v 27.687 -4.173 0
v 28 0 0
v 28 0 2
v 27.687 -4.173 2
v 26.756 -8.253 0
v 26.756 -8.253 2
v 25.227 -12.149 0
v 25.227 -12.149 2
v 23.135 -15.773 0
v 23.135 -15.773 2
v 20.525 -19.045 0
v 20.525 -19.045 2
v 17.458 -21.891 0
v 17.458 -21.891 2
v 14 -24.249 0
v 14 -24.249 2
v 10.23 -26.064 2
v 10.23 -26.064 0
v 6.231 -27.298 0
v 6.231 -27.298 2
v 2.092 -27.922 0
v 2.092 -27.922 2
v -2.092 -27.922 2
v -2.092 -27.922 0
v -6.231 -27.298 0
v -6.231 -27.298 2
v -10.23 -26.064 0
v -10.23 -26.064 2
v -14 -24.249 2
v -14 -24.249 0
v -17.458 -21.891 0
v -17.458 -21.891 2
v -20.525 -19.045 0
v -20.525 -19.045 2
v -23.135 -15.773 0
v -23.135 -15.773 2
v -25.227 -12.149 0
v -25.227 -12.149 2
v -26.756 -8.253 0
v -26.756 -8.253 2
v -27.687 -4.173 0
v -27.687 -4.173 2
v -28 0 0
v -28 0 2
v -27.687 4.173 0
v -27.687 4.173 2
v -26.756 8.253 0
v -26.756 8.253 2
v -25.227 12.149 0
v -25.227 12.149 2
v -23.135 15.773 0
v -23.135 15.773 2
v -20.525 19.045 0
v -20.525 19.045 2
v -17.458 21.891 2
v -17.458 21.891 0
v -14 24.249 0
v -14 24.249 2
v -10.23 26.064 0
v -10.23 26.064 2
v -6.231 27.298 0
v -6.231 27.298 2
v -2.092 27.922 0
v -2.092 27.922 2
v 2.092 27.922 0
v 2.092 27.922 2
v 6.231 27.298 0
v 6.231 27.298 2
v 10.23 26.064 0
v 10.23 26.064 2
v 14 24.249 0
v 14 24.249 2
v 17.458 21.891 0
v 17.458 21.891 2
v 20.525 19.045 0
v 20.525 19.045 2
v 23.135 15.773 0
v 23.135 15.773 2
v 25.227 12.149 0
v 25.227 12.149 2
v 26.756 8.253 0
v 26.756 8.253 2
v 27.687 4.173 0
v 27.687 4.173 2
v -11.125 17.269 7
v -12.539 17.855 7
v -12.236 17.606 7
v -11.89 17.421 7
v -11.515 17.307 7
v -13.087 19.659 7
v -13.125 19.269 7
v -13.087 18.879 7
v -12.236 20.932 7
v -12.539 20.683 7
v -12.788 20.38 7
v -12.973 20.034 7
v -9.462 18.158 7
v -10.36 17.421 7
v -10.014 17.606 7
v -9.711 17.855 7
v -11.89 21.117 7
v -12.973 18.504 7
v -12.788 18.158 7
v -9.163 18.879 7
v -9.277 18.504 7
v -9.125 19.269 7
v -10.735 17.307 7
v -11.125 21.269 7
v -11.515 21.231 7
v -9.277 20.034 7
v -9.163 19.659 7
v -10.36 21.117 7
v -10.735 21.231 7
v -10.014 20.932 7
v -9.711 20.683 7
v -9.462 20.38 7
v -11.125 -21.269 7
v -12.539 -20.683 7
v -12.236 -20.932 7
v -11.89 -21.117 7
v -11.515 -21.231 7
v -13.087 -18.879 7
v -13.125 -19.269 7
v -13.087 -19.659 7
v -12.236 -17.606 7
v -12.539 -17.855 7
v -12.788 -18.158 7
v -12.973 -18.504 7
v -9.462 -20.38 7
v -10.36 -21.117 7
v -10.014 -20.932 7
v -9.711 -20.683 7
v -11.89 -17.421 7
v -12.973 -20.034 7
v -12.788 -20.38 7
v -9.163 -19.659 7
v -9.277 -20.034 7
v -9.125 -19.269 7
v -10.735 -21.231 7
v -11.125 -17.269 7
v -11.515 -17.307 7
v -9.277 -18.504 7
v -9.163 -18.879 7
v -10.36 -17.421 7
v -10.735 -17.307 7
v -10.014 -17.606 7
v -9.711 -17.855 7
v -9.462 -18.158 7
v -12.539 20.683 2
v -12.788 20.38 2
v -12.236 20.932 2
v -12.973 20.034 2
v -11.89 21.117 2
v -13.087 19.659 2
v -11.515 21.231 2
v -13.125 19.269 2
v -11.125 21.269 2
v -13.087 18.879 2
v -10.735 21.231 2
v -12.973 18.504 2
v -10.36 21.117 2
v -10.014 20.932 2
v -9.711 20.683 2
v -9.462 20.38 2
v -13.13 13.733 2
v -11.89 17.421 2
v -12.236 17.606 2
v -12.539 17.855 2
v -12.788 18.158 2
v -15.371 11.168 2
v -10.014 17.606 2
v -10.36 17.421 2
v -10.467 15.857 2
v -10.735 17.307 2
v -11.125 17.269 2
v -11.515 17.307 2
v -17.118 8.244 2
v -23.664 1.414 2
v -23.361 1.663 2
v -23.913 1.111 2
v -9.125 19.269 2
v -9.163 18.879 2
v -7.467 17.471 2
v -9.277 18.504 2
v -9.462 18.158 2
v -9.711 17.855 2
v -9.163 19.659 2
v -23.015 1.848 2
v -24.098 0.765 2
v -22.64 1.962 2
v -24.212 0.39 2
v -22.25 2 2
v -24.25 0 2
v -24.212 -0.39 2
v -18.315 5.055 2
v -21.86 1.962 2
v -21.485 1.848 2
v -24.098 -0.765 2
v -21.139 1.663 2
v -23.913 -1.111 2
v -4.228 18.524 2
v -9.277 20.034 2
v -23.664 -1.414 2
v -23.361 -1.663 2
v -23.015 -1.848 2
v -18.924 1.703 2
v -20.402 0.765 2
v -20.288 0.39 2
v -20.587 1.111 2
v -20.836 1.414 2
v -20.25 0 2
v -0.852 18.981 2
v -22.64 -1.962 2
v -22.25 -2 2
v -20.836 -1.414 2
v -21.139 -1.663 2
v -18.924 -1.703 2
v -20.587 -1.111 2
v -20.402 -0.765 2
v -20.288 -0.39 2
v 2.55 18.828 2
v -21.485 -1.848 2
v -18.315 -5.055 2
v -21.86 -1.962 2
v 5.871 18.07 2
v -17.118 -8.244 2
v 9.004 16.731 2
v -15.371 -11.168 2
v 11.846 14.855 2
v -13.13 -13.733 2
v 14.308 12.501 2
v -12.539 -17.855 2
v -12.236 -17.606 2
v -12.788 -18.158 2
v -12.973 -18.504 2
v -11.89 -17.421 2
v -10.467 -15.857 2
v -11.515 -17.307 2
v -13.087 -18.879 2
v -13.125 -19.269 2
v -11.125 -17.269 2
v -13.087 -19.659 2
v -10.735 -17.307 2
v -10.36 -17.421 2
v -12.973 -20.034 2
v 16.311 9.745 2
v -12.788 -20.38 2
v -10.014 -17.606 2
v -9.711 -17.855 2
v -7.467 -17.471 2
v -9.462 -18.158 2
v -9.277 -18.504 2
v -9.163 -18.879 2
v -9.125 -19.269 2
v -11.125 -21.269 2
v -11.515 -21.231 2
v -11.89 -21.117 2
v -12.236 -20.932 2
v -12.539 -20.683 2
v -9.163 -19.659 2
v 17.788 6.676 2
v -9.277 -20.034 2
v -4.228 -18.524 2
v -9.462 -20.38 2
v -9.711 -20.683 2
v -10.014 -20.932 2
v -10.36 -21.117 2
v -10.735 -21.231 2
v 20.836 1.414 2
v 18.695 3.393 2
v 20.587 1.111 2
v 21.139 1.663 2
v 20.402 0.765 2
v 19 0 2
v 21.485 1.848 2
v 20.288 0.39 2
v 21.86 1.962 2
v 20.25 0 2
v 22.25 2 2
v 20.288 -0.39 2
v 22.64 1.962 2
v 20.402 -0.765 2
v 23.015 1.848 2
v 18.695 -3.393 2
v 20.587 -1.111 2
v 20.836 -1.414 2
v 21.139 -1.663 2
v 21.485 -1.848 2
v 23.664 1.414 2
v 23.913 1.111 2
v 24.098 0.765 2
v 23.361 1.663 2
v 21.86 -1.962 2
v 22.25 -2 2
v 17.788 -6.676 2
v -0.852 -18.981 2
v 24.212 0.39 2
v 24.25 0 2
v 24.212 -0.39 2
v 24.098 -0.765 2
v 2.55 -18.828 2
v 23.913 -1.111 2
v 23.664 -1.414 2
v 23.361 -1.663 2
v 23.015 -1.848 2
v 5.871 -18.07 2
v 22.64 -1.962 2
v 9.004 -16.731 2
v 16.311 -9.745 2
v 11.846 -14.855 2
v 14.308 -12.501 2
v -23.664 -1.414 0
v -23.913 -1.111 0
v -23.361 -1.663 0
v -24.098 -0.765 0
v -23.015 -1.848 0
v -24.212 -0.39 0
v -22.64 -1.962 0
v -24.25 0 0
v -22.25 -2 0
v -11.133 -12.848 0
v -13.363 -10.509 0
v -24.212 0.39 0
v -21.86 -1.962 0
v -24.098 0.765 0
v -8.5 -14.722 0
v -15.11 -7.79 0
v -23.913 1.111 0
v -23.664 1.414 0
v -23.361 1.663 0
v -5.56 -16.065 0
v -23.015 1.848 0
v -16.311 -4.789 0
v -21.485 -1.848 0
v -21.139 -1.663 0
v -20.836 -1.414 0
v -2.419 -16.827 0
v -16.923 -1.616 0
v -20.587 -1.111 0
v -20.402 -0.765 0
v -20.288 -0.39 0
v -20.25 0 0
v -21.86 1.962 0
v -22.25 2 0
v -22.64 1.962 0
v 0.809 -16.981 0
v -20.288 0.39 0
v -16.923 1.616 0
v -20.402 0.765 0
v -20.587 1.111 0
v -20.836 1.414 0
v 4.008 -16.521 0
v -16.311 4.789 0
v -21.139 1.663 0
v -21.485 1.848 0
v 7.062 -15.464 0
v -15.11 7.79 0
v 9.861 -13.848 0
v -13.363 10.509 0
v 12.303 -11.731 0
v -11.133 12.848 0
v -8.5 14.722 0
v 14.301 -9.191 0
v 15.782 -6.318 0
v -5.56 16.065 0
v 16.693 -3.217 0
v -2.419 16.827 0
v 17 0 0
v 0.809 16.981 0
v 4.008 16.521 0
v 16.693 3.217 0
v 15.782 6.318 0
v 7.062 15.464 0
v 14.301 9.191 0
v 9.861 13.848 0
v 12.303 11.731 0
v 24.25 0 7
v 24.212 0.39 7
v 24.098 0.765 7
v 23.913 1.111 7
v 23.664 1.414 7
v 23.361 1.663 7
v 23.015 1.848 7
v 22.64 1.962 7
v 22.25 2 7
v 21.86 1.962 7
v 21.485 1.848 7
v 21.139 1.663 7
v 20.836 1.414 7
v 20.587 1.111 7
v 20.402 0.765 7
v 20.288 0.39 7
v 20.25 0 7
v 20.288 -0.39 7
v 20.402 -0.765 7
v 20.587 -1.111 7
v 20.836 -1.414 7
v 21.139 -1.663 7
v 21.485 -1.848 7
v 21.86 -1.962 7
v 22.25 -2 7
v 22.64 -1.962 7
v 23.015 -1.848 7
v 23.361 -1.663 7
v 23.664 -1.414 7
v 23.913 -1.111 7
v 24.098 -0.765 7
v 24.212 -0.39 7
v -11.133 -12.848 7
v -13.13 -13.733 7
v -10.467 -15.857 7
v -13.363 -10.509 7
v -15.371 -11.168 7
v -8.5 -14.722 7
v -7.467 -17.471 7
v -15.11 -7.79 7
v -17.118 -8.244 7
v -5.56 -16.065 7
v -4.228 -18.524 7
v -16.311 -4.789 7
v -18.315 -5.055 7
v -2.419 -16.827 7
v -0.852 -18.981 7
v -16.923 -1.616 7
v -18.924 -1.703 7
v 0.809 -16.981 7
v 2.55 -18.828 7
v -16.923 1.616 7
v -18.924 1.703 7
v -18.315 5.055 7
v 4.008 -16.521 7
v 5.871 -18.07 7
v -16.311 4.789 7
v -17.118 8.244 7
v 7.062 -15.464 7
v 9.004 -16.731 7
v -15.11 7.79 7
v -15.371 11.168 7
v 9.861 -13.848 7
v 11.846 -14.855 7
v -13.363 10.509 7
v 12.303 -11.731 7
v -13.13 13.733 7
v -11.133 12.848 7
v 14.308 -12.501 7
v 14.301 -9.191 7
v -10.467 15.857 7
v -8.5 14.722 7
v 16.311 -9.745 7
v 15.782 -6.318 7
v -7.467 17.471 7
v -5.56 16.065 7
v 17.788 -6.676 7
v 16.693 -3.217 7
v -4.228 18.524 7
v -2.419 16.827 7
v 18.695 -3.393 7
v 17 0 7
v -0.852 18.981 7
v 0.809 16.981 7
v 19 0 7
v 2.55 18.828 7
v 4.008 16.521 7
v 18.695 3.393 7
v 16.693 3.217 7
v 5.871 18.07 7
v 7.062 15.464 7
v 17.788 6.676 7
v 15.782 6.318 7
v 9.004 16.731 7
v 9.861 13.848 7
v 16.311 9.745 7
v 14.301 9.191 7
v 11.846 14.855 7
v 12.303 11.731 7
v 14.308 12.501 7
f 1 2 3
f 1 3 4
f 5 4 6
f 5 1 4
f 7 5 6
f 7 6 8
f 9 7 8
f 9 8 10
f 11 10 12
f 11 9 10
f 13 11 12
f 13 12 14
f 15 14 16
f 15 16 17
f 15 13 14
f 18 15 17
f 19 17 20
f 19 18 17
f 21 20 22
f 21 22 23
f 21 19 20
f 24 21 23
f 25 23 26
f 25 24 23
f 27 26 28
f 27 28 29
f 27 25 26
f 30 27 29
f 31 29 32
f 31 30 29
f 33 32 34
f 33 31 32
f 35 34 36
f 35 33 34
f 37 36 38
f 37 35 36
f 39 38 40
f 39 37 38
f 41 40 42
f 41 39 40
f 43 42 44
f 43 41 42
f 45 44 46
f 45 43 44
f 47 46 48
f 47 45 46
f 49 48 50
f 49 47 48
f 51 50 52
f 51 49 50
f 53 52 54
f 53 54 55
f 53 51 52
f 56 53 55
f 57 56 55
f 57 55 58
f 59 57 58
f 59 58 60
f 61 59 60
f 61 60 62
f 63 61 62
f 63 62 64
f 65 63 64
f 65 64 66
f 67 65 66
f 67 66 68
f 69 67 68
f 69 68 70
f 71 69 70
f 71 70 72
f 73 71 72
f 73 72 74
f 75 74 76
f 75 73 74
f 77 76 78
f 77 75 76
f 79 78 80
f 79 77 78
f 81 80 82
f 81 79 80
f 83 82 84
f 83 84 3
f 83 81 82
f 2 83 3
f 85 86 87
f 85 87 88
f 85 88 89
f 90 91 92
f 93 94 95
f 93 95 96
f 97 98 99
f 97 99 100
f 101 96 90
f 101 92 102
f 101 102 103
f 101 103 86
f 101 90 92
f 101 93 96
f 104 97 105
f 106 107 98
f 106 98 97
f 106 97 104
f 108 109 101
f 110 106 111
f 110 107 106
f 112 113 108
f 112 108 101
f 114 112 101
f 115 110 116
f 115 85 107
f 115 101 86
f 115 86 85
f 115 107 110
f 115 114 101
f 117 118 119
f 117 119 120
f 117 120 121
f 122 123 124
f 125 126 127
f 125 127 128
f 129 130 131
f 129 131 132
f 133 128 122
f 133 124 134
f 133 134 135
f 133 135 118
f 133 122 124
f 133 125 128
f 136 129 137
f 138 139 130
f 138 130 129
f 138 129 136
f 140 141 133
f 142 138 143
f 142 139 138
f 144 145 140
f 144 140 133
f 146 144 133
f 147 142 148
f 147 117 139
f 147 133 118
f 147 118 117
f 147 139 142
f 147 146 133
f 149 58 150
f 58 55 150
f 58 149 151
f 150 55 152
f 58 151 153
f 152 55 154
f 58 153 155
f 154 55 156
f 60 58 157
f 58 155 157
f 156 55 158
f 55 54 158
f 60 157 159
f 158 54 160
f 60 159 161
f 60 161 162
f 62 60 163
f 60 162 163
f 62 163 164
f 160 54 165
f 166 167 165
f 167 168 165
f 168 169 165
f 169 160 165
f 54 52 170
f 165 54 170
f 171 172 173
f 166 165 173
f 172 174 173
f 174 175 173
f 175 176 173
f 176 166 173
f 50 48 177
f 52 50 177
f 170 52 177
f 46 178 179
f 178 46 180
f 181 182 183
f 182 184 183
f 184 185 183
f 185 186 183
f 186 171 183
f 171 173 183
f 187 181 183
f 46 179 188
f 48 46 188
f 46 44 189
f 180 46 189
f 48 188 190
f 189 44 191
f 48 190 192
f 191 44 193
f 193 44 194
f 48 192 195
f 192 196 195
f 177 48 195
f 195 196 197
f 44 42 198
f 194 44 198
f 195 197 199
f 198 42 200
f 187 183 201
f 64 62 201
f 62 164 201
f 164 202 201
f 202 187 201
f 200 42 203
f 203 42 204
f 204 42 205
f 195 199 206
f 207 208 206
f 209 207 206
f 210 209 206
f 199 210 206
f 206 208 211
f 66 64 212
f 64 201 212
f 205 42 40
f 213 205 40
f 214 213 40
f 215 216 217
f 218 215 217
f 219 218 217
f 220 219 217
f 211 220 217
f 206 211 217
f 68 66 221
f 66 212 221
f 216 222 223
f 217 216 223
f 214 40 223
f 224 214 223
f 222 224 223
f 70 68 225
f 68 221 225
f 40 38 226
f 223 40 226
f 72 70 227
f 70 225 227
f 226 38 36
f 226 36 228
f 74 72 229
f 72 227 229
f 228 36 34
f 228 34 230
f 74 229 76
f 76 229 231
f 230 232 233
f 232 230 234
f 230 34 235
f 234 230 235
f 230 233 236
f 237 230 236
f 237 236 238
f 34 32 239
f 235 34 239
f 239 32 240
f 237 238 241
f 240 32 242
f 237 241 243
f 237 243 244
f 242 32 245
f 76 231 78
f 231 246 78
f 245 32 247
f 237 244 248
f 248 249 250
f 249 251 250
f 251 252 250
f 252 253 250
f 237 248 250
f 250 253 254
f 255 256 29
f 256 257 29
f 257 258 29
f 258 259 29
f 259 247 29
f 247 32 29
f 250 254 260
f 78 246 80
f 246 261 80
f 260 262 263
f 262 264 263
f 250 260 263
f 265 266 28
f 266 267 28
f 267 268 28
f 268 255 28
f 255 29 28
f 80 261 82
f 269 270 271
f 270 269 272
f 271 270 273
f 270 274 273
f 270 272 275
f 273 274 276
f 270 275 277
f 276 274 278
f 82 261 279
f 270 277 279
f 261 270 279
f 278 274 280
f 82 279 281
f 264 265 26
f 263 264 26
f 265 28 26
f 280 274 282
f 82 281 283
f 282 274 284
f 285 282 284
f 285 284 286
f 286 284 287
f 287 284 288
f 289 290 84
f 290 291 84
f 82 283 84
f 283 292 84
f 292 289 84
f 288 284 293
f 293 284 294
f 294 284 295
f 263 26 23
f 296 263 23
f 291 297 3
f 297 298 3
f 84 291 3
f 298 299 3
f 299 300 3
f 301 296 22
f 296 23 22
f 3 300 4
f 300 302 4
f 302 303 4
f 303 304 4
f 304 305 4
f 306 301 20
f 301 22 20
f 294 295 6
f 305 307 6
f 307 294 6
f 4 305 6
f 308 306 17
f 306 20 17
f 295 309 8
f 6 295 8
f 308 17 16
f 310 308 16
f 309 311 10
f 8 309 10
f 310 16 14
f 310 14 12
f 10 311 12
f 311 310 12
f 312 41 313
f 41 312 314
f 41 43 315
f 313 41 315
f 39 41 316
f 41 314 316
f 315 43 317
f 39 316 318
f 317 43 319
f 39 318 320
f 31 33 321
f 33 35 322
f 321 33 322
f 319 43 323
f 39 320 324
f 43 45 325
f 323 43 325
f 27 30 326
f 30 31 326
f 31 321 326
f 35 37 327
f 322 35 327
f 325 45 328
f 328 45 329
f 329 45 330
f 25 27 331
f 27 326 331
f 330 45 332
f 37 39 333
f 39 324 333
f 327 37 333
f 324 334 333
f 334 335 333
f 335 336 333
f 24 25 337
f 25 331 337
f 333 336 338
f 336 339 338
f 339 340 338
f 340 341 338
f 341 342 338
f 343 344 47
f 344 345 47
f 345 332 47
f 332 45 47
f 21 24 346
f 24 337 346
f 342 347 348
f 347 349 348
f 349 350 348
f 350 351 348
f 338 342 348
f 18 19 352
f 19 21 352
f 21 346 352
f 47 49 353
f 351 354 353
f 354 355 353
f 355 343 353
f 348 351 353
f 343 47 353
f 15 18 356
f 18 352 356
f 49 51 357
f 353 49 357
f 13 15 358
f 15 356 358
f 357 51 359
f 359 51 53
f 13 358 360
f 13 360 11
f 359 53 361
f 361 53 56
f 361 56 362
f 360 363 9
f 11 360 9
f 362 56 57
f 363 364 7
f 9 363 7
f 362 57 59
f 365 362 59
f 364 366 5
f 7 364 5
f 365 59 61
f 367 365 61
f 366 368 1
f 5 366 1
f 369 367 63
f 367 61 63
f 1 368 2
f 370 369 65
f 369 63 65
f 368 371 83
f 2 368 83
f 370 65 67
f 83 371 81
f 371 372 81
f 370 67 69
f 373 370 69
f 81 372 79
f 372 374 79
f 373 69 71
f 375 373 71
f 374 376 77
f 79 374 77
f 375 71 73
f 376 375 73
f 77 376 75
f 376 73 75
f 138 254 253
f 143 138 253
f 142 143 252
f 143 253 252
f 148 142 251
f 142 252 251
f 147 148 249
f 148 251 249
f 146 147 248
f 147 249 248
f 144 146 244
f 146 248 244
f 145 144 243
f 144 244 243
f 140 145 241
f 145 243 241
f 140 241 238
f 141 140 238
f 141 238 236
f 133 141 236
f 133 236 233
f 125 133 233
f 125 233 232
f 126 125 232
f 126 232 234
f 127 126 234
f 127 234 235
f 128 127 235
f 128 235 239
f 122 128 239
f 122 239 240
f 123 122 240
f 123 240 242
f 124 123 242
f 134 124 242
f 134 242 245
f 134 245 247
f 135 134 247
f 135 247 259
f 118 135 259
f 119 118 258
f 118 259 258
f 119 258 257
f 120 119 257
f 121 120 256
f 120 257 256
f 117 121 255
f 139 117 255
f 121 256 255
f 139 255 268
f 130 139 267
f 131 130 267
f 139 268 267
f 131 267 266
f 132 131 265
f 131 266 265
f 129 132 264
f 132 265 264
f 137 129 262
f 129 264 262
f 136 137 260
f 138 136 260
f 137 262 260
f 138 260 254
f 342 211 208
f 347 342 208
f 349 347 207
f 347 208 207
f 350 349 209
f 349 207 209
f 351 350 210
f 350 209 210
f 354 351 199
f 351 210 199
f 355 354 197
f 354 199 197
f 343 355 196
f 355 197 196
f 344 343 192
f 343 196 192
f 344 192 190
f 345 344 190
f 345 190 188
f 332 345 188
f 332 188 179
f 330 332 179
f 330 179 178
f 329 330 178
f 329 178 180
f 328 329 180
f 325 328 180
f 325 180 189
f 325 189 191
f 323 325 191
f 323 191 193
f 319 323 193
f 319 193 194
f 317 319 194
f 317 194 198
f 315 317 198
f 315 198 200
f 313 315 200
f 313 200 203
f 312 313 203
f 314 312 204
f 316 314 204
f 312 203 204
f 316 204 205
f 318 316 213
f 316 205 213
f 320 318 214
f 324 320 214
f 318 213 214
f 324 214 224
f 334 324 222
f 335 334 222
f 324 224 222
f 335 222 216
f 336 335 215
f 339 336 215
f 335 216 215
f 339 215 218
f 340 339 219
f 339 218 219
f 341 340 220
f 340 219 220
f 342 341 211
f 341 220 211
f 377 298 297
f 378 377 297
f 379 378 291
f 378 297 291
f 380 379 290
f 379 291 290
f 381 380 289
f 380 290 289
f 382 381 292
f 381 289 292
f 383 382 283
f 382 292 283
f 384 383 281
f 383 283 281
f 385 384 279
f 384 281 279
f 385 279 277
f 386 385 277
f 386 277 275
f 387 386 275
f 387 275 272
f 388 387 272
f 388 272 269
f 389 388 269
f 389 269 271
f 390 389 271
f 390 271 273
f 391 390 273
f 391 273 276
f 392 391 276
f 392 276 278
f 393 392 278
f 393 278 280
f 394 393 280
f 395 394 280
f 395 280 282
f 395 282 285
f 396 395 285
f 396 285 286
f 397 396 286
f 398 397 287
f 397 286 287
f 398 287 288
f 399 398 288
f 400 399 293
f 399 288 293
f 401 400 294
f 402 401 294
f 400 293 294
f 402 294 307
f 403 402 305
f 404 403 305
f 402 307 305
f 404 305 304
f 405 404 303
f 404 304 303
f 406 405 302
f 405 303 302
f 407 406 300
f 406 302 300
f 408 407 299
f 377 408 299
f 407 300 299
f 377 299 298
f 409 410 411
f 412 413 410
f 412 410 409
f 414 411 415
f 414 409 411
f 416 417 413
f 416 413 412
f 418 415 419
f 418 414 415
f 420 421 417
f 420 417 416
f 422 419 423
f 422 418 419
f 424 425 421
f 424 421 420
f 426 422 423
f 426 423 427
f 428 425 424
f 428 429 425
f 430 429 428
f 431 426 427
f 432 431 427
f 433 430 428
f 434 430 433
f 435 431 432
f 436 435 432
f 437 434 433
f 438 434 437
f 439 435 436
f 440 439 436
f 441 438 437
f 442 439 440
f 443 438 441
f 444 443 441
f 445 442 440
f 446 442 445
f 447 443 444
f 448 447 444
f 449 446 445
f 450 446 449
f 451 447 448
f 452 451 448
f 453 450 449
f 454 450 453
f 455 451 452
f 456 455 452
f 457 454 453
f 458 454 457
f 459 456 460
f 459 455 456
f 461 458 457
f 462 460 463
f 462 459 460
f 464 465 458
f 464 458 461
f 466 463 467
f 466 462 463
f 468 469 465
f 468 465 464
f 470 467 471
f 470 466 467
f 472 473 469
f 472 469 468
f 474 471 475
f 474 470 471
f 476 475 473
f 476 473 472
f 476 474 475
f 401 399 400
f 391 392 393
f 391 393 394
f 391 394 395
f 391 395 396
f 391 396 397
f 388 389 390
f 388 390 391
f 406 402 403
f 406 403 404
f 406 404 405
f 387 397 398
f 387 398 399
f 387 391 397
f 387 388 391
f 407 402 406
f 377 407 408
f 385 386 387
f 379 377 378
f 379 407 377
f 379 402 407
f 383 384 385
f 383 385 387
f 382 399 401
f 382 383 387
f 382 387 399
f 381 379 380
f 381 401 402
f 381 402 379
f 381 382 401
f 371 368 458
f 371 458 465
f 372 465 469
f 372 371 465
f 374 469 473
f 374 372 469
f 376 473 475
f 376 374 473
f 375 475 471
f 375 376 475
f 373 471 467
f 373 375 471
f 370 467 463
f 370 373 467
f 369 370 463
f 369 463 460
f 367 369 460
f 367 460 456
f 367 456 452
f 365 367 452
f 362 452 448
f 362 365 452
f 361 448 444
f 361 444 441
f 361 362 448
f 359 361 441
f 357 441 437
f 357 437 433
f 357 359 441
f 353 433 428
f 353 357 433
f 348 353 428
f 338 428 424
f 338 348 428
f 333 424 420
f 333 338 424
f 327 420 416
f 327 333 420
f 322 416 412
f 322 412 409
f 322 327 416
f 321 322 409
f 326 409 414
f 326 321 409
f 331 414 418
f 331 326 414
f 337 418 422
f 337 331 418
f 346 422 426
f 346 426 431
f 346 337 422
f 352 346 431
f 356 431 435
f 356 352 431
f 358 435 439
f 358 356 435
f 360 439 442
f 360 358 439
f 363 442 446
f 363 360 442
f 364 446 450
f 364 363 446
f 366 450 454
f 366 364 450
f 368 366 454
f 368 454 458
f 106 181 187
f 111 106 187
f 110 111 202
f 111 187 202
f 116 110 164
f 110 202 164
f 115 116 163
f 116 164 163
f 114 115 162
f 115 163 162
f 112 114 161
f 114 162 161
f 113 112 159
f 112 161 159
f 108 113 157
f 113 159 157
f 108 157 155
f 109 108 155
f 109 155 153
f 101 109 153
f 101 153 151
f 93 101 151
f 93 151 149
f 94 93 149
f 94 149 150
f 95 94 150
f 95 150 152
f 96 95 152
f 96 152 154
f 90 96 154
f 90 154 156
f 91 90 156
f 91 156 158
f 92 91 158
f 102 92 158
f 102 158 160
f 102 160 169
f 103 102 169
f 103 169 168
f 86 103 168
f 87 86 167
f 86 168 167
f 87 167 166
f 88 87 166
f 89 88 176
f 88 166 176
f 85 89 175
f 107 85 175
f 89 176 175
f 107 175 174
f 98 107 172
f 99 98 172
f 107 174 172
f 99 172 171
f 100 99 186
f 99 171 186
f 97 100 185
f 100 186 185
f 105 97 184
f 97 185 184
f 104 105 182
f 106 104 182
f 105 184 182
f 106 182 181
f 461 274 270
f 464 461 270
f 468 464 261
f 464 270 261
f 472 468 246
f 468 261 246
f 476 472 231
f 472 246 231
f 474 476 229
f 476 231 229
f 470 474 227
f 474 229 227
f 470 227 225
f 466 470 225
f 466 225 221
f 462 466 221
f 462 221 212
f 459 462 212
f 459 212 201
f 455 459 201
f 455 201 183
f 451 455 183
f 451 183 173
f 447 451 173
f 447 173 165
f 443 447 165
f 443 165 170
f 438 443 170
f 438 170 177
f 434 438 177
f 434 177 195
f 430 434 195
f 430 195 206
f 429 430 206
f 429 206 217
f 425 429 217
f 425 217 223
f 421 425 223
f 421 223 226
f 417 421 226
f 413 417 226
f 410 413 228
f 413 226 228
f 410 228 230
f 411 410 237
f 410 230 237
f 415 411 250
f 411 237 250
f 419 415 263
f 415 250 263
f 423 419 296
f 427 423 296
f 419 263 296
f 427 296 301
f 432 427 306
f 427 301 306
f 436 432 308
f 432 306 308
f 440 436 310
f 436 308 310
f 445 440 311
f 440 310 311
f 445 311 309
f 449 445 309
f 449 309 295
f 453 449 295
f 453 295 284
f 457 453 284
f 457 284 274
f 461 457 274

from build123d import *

# Parameters (mm, degrees)
SKETCH019_R     = 19
SKETCH019_R_2   = 17
PAD009003_DEPTH = 7
SKETCH017_R     = 28
SKETCH017_R_2   = 19
PAD009004_DEPTH = 2
SKETCH018_R     = 2
PAD009005_DEPTH = 7
SKETCH020_R     = 2
POCKET003_DEPTH = 5


with BuildPart() as part:
    # Sketch019 → Pad009003 (new body)
    with BuildSketch(Plane.XY):
        Circle(SKETCH019_R)
        Circle(SKETCH019_R_2, mode=Mode.SUBTRACT)
    extrude(amount=PAD009003_DEPTH)

    # Sketch017 → Pad009004 (join)
    with BuildSketch(Plane(origin=(0, 0, 0), x_dir=(1, 0, 0), z_dir=(0, 0, -1))):
        Circle(SKETCH017_R)
        Circle(SKETCH017_R_2, mode=Mode.SUBTRACT)
    extrude(amount=-PAD009004_DEPTH)

    # Sketch018 → Pad009005 (join)
    with BuildSketch(Plane.XY):
        with Locations((22.25, 0)):
            Circle(SKETCH018_R)
        with Locations((-11.125, 19.269065)):
            Circle(SKETCH018_R)
        with Locations((-11.125, -19.269065)):
            Circle(SKETCH018_R)
    extrude(amount=PAD009005_DEPTH)

    # Sketch020 → Pocket003 (cut)
    with BuildSketch(Plane.XY.offset(2.2)):
        with Locations((-22.25, 0)):
            Circle(SKETCH020_R)
    extrude(amount=-POCKET003_DEPTH, mode=Mode.SUBTRACT)


solid = part.part
